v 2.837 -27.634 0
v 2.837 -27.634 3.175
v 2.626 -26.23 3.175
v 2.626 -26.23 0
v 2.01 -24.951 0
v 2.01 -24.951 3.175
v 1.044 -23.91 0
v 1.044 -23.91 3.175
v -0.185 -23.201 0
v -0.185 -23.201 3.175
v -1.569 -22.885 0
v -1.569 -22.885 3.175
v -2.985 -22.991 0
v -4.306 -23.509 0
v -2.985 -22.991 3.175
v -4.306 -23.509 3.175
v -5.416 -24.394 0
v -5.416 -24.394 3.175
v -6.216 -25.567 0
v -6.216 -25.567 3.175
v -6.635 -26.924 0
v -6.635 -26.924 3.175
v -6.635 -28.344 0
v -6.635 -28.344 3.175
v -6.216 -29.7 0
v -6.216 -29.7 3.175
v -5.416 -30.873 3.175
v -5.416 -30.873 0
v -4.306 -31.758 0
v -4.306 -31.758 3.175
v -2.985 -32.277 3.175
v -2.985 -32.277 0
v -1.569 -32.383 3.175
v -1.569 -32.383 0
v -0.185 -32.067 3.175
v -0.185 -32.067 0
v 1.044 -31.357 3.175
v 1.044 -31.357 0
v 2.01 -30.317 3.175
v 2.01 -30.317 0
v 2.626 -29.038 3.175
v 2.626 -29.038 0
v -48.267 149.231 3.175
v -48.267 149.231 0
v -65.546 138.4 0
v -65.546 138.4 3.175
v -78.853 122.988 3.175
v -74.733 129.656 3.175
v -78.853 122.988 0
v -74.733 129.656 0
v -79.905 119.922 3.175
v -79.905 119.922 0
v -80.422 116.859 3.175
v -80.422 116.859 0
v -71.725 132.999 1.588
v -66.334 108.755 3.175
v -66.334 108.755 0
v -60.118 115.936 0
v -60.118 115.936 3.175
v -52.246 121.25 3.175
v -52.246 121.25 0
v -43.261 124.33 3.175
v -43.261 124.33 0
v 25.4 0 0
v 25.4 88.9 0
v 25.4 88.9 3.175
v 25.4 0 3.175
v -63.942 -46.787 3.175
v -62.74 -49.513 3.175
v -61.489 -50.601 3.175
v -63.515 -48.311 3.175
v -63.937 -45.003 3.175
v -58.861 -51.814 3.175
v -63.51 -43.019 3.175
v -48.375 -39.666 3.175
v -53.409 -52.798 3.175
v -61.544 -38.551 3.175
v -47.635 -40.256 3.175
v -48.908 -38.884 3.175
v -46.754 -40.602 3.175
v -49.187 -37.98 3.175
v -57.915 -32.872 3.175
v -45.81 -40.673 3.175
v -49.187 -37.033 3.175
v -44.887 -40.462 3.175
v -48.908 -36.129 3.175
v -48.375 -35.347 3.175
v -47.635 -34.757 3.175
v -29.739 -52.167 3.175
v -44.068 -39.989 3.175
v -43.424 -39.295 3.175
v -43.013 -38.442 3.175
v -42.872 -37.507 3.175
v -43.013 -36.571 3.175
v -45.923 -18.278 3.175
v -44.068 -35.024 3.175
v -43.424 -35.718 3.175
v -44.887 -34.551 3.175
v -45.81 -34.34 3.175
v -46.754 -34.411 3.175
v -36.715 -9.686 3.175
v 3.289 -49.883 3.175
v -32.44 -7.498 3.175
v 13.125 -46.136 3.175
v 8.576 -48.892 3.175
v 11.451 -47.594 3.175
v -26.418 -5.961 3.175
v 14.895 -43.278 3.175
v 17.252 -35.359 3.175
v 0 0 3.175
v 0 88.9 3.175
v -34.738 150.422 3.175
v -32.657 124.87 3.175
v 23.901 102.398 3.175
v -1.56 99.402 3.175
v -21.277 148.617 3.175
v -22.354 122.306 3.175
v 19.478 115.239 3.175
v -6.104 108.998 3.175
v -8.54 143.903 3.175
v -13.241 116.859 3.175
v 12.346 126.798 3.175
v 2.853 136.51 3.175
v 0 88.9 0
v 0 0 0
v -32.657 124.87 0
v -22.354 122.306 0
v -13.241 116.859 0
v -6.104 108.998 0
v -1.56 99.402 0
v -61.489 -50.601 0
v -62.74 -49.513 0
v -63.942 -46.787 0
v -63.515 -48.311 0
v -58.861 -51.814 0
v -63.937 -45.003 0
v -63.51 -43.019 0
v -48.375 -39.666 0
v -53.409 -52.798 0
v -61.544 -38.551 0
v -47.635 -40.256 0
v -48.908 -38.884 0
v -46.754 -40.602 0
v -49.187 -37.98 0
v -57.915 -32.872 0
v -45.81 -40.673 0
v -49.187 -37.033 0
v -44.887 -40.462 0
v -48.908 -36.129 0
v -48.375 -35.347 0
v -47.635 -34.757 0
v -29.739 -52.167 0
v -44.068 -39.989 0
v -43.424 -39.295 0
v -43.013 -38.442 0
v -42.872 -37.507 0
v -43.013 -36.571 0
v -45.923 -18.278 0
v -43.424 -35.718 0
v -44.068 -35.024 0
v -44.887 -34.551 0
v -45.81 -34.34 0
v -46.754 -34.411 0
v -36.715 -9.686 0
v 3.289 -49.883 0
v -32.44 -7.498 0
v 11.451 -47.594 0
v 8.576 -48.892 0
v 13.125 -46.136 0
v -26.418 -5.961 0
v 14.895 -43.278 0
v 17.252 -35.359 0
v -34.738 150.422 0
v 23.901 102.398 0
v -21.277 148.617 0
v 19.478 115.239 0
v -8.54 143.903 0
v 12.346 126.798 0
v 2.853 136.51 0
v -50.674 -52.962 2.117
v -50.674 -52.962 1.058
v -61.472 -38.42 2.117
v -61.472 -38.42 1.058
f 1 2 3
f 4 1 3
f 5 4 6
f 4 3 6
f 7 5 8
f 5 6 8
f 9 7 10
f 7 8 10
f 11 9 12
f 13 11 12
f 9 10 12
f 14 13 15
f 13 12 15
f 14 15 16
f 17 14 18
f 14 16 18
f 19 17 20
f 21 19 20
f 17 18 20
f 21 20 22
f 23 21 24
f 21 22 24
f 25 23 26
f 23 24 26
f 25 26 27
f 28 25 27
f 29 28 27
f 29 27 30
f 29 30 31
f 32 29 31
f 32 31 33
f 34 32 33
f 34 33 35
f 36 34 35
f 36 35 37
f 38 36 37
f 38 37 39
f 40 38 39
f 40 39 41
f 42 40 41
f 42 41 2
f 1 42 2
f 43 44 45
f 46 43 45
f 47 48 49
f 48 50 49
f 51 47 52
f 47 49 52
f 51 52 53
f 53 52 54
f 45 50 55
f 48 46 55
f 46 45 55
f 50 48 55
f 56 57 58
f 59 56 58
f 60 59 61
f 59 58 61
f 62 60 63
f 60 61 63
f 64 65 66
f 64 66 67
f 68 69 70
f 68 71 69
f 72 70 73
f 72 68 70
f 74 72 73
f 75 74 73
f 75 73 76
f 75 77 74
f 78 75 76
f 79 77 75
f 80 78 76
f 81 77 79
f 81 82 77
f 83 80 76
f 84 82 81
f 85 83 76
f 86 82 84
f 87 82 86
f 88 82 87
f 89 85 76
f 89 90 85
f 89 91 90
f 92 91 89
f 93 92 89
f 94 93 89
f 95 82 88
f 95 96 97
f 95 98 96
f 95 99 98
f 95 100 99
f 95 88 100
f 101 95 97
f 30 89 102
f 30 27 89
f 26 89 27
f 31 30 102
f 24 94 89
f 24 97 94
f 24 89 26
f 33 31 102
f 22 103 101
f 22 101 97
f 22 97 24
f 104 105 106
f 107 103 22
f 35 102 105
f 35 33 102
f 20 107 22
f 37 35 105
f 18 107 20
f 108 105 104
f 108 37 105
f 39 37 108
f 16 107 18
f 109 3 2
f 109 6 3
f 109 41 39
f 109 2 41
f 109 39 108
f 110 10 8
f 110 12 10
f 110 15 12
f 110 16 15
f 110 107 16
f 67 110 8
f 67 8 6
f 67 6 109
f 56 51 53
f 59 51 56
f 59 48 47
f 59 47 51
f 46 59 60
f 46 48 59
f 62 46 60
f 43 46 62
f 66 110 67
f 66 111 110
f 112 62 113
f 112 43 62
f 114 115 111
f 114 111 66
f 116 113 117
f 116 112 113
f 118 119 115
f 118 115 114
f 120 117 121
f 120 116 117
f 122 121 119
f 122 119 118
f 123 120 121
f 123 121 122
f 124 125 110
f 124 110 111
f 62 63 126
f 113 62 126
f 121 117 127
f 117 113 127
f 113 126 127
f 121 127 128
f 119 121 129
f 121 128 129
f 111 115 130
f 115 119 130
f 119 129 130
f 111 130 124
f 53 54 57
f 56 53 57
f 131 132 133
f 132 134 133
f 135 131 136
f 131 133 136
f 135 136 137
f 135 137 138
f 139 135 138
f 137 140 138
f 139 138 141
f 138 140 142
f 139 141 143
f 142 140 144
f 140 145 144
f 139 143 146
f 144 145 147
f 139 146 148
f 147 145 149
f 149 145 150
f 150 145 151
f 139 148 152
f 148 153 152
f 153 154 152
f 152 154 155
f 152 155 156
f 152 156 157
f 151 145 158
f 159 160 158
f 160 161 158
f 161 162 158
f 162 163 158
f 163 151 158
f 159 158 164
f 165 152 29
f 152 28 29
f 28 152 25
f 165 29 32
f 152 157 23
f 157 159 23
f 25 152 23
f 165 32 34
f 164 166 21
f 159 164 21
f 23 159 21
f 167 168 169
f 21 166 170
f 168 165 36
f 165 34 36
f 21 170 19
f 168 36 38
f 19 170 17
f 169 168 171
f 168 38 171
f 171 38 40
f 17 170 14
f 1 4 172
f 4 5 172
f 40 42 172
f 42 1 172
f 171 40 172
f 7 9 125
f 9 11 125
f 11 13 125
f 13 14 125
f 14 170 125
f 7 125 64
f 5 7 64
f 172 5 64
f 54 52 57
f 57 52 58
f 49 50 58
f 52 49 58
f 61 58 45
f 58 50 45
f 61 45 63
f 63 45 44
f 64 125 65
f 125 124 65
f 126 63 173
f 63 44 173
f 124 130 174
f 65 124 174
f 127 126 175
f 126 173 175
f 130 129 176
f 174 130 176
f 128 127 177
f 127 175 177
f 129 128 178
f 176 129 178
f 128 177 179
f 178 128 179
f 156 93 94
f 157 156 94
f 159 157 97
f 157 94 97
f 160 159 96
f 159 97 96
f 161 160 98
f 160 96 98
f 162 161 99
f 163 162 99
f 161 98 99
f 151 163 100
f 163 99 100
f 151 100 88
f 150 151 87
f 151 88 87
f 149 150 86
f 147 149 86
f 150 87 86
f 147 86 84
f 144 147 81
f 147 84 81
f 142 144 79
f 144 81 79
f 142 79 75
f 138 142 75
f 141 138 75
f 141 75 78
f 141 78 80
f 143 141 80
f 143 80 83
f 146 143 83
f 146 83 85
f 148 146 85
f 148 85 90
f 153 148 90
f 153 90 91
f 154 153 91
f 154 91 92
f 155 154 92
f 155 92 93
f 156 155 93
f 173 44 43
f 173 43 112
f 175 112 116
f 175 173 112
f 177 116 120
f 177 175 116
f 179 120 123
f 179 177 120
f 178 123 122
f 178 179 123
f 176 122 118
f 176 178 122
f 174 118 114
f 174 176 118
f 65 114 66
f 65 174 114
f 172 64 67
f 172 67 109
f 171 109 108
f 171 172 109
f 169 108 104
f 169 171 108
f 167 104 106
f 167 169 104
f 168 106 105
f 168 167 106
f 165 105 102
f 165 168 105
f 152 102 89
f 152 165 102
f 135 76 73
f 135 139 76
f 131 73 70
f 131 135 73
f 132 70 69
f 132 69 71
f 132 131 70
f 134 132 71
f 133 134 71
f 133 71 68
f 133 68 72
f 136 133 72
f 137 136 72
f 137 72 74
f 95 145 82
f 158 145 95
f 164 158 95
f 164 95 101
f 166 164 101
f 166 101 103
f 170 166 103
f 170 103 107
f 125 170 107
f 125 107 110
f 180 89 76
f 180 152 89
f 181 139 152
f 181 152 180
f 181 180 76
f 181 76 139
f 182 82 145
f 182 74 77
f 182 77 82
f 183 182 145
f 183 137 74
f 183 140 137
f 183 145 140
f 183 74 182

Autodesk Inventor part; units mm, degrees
ref_plane "YZ Plane" through (0, 0, 0) normal (1, 0, 0) x (0, 1, 0)
ref_plane "XZ Plane" through (0, 0, 0) normal (0, 1, 0) x (-1, 0, 0)
ref_plane "XY Plane" through (0, 0, 0) normal (0, 0, 1) x (1, 0, 0)
sketch "Sketch1" plane through (0, 0, 0) normal (0, 0, 1) x (1, 0, 0)
  line L0 (0, 0) -> (0, 88.9)
  arc A0 (0, 88.9) -> (-43.2611, 124.3295) centre (-36.1384, 88.9) ccw
  arc A1 (25.4, 88.9) -> (-48.2673, 149.2313) centre (-36.1384, 88.9) ccw
  line L1 (25.4, 88.9) -> (25.4, 0)
  line L2 (-48.2673, 149.2313) -> (-79.1061, 132.9539) construction
  line L3 (-79.1061, 132.9539) -> (-80.4219, 116.8588) construction
  spline S0 degree 2 poles (-48.2673, 149.2313) (-79.1061, 132.9539) (-80.4219, 116.8588) knots 1 1 1 2 2 2
  line L4 (-80.4219, 116.8588) -> (-66.3336, 108.7553)
  arc A2 (-43.2611, 124.3295) -> (-66.3336, 108.7553) centre (-36.1384, 88.9) ccw
  spline S1 degree 4 poles (25.4, 0) (6.7382, -69.5402) (37.5135, -31.4962) (-135.4701, -89.9886) (-17.3215, 6.2019) (-45.9643, -12.3049) (0, 0) knots 0 0 0 0 0 0.457859 0.613197 1 1 1 1 1
  point P0 (8.6177, -48.8789)
  point P1 (-30.2905, -52.2043)
  point P2 (-63.6867, -47.8812)
  point P3 (-50.9086, -23.938)
  point P4 (-36.1384, -9.3062)
  dimension "d0" = 88.9
  dimension "d2" = 25.4
extrude "Extrusion1" add sketch "Sketch1" along normal blind 3.175
sketch "Sketch2" plane through (0, 0, 3.175) normal (0, 0, 1) x (1, 0, 0)
  circle A0 centre (-1.9252, -27.6338) radius 4.7625
  circle A1 centre (-46.0473, -37.5066) radius 3.175
  point P0 (0, 0)
  dimension "d5" = 9.525
  dimension "d6" = 6.35
extrude "Extrusion2" cut sketch "Sketch2" against normal blind 3.175
properties part number "Climb HOok pt 1"
